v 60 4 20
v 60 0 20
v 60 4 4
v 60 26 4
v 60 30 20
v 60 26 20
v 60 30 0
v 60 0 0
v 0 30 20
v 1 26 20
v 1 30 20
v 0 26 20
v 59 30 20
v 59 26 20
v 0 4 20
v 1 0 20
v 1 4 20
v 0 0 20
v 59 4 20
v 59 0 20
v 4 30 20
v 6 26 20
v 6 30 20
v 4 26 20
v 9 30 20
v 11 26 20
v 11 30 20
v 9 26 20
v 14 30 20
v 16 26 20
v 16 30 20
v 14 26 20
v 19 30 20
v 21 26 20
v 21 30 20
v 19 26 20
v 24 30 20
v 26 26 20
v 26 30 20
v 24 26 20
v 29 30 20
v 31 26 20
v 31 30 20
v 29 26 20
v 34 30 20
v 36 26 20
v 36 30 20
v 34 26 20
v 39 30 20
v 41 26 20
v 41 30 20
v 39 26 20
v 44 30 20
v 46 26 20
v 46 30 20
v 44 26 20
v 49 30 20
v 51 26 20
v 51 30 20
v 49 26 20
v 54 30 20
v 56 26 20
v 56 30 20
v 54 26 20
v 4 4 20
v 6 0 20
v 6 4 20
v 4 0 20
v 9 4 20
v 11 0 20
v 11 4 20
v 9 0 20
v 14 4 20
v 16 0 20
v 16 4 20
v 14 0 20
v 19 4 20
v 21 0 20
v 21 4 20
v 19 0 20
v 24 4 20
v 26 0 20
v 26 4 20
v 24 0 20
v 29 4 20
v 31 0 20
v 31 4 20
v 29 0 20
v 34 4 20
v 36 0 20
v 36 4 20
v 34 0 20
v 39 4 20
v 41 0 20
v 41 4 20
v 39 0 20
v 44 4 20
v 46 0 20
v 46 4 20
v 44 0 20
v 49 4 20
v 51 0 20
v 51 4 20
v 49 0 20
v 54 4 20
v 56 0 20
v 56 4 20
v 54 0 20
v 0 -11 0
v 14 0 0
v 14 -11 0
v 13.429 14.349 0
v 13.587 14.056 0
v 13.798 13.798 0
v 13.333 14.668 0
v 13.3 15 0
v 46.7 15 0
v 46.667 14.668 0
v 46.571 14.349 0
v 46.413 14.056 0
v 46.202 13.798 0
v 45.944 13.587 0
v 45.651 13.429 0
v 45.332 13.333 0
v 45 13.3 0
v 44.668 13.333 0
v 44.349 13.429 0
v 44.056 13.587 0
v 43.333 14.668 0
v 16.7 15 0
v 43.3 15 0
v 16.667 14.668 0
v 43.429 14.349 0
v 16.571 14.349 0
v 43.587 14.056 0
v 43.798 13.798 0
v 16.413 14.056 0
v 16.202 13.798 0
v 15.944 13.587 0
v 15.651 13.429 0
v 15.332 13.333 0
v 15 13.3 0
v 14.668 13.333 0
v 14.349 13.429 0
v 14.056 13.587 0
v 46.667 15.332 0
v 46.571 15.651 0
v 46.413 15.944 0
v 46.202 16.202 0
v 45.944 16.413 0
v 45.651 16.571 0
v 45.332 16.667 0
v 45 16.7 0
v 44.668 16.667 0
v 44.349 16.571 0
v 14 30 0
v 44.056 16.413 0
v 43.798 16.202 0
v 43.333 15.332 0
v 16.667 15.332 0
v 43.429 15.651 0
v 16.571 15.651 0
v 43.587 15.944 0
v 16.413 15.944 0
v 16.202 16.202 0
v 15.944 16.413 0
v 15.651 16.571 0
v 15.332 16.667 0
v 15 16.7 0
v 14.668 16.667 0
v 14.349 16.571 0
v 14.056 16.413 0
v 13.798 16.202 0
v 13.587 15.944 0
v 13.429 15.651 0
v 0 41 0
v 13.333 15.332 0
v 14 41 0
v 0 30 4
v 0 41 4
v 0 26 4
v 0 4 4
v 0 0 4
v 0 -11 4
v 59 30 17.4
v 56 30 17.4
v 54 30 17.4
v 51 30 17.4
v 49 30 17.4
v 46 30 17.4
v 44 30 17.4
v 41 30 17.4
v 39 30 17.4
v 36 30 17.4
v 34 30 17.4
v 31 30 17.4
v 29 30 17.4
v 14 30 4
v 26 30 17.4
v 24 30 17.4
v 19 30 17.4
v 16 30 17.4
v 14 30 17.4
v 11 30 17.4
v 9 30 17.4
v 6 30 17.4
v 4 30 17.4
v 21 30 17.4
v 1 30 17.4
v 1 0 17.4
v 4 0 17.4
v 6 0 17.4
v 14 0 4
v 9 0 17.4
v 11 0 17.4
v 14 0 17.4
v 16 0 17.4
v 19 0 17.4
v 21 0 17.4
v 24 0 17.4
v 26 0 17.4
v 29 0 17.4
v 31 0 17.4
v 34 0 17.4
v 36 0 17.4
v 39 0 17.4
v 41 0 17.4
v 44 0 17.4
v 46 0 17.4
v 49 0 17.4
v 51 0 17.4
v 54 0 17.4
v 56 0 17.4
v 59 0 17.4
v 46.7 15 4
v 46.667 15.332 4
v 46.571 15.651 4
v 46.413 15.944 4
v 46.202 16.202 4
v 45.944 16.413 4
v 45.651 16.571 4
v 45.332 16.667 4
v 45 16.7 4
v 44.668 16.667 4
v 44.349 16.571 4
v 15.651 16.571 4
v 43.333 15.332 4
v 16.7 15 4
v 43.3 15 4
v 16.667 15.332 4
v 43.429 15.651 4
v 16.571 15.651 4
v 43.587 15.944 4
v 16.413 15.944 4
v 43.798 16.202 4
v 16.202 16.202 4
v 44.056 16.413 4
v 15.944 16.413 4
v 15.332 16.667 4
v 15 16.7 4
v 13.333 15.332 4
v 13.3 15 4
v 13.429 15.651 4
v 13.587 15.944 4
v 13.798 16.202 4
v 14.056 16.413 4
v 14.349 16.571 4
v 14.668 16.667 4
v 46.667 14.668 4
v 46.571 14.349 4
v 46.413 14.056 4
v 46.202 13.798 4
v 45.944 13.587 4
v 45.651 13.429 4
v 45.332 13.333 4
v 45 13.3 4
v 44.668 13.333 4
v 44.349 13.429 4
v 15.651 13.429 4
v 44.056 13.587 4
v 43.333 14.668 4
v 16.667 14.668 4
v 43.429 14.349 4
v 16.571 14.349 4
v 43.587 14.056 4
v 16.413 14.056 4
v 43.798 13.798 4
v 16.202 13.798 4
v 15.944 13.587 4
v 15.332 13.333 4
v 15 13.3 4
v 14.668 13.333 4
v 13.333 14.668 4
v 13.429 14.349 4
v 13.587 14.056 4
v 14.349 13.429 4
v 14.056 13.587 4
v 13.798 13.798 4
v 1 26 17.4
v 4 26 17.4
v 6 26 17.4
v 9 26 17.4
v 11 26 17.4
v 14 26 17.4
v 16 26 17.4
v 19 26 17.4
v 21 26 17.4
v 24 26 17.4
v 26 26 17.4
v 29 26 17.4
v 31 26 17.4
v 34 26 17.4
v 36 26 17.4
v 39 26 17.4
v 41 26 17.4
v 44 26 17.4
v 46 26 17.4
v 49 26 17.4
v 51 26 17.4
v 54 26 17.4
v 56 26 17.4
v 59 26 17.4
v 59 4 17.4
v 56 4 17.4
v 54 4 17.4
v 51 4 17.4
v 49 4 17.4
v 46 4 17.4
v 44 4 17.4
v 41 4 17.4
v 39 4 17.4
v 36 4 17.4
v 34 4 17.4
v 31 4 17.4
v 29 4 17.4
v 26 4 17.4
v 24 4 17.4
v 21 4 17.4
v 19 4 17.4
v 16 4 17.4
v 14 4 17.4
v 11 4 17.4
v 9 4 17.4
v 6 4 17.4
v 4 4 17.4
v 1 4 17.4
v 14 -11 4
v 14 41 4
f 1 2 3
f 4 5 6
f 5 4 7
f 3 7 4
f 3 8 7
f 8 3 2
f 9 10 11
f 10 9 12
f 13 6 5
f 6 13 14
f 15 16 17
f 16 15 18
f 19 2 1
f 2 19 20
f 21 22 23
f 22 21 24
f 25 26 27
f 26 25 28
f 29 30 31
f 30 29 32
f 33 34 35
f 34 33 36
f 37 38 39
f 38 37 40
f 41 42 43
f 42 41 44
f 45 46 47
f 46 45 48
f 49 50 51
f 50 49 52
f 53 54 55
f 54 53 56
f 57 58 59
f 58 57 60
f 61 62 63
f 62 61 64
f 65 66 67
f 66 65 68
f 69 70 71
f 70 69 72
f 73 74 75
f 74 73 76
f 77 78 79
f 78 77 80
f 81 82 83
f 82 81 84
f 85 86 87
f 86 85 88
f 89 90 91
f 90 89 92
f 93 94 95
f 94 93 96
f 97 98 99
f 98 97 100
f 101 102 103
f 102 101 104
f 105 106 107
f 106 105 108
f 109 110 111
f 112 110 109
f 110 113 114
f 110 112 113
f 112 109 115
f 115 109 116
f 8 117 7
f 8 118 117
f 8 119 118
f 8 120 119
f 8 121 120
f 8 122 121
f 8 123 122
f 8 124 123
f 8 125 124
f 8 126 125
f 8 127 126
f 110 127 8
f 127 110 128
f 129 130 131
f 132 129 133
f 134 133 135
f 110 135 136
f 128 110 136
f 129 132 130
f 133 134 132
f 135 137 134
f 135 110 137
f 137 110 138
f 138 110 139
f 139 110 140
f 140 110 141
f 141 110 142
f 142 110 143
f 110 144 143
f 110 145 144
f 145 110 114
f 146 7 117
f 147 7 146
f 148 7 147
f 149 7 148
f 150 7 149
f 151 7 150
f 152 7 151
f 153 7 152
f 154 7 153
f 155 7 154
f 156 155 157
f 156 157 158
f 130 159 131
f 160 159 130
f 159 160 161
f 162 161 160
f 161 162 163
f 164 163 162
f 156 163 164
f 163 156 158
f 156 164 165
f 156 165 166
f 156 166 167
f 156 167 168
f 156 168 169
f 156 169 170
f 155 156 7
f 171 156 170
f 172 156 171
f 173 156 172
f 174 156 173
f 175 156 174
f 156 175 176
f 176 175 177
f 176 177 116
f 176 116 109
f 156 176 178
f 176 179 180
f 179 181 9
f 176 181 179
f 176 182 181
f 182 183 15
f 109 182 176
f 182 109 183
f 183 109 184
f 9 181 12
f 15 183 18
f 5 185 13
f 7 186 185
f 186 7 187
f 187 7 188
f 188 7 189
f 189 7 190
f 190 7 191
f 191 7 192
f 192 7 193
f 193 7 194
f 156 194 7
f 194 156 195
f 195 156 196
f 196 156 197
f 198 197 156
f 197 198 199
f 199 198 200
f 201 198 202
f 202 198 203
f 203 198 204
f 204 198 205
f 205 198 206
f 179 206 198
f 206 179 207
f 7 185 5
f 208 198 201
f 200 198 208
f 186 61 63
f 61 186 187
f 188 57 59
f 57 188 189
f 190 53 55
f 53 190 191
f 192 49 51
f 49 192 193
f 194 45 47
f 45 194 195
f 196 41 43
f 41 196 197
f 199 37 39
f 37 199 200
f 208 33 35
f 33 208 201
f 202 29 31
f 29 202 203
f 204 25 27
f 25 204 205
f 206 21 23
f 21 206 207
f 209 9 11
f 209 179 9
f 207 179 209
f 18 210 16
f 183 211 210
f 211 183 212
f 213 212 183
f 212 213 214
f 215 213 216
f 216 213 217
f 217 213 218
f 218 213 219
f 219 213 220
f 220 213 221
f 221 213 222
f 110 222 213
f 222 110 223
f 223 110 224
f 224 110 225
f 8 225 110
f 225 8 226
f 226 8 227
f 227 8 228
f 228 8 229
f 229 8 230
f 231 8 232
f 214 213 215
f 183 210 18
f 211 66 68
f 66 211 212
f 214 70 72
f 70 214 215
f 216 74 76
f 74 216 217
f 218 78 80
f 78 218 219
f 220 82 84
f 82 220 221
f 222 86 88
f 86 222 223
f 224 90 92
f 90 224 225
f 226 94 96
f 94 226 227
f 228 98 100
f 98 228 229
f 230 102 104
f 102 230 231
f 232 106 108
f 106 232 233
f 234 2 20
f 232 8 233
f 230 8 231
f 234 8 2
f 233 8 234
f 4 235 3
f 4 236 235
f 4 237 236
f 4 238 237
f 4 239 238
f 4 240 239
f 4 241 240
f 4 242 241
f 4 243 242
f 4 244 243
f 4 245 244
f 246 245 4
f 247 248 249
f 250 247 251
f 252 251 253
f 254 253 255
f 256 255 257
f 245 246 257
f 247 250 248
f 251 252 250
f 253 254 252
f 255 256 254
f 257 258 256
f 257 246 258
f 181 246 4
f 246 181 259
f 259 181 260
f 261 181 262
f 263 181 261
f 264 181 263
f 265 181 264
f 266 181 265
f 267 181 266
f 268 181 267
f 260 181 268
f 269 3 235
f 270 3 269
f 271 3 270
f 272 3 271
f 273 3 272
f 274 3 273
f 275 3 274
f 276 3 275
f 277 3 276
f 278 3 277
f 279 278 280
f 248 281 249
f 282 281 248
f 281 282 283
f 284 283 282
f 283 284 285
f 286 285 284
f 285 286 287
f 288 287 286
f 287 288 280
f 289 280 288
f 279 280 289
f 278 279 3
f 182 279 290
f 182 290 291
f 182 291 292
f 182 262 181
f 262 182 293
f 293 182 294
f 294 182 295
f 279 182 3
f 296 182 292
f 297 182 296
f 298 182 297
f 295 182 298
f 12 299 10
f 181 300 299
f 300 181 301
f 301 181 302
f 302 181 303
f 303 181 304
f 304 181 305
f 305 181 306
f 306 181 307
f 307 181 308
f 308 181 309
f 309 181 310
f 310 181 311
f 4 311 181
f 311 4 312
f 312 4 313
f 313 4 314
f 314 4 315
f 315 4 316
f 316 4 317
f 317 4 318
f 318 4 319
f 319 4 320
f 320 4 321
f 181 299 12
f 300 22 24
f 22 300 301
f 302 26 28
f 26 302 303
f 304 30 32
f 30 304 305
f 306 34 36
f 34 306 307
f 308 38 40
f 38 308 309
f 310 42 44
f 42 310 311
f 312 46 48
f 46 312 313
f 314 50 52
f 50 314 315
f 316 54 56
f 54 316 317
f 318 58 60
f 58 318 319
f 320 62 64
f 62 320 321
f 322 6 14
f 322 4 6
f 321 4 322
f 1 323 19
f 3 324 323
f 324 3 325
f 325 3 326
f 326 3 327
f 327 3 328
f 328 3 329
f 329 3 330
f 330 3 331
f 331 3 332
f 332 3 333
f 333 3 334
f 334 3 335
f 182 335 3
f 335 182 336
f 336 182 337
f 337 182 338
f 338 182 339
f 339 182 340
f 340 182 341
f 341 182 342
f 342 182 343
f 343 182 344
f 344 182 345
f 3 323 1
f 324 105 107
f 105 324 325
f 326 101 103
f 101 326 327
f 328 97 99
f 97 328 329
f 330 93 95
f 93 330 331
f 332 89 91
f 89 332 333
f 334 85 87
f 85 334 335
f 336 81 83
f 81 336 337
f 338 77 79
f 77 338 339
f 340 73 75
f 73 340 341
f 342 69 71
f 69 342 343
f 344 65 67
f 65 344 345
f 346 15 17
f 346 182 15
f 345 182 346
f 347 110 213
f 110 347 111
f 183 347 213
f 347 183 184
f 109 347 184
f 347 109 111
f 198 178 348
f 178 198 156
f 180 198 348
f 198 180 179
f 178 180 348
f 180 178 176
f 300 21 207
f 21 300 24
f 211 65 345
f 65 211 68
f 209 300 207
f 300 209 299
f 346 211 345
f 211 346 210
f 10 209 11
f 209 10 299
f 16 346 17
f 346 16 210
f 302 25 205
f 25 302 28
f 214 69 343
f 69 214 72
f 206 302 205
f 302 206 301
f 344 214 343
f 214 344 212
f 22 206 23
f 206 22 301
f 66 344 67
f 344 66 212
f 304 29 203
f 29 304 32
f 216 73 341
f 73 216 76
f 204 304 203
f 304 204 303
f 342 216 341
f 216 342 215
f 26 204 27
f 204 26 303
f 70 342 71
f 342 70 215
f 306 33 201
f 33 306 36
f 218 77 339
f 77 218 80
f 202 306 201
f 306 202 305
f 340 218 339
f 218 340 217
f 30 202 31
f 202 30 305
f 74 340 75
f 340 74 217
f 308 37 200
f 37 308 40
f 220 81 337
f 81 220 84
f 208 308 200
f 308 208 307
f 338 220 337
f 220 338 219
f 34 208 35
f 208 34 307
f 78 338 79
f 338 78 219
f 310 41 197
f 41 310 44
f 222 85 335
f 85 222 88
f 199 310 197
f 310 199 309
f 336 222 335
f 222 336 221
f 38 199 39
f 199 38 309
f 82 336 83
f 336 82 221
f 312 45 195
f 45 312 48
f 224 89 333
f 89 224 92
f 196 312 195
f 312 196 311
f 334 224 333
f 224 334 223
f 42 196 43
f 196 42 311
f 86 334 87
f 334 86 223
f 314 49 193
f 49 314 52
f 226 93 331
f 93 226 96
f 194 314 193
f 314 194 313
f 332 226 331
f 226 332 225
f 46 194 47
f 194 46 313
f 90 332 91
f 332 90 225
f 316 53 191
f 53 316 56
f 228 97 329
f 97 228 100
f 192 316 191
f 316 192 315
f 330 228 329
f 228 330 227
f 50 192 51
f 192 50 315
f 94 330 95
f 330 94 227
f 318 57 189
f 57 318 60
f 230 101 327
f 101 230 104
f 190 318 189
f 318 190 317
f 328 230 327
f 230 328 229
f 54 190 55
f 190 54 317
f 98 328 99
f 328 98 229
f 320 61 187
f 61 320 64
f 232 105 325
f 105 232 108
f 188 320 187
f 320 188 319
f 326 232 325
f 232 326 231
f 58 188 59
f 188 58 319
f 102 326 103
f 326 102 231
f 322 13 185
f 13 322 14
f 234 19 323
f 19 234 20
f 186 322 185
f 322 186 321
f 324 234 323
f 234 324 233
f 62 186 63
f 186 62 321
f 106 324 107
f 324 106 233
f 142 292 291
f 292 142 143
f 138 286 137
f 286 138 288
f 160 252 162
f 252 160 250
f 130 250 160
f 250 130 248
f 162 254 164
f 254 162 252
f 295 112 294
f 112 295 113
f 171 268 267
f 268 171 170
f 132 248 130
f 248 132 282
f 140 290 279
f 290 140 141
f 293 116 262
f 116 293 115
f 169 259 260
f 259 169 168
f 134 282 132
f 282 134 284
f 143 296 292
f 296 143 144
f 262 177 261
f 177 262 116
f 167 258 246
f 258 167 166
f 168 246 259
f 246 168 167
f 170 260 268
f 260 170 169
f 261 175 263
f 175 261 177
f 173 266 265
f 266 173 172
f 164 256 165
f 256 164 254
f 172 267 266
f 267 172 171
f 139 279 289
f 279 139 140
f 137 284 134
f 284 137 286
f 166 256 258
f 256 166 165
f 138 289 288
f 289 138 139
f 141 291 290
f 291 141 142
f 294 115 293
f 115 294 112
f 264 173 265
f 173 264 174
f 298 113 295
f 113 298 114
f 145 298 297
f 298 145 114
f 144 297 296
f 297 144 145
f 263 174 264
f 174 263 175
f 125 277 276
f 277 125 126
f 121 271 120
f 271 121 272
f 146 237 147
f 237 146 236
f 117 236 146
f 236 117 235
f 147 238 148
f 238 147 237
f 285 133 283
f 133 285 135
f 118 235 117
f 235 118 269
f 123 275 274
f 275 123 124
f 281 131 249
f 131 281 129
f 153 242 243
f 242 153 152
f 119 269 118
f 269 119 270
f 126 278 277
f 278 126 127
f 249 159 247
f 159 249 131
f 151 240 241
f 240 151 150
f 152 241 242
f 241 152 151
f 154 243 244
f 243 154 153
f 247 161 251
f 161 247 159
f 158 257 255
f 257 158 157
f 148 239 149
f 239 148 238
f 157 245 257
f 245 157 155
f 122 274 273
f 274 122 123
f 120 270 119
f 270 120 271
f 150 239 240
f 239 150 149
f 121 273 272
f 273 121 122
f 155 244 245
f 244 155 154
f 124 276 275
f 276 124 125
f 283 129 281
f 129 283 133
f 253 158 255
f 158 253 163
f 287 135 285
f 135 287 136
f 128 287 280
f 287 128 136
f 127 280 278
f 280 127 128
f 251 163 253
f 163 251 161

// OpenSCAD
$fn = 32;

// ----------------------------------------------------------------------
// Cable duct: 60 x 30 x 20 mm, 12 fingers
// ----------------------------------------------------------------------

// --- parameters (mm) ---
duct_len = 60;            // duct length, X
duct_w = 30;              // duct width, Y
duct_h = 20;              // duct height, Z
wall_t = 4;               // side wall thickness
floor_t = 4;              // floor thickness
slot_w = 3;               // finger slot width
slot_h = 13.4;            // finger slot height
fingers = 12;             // number of finger slots per side
pitch = 5;                // finger pitch
hole_d = 3.4;             // floor mounting hole
hole_n = 2;               // mounting holes in the floor
ear_w = 12;               // mounting ear width
ear_l = 14;               // mounting ear length

module shell() {
  difference() {
    cube([duct_len, duct_w, duct_h]);
    /* open top channel */
    translate([-wall_t - 1, wall_t, floor_t])
      cube([duct_len + 2 * wall_t + 2, duct_w - 2 * wall_t, duct_h + 1]);
  }
}

module ears() {
  translate([0, -ear_w + 1, 0]) cube([ear_l, ear_w, floor_t]);
  translate([0, duct_w - 1, 0]) cube([ear_l, ear_w, floor_t]);
}

difference() {
  union() {
    shell();
    ears();
  }
  /* finger slots cut through both side walls */
  for (i = [0 : fingers - 1]) translate([pitch / 2 + i * pitch - slot_w / 2, -1, floor_t + slot_h]) cube([slot_w, duct_w + 2, duct_h]);
  for (i = [0 : hole_n - 1]) translate([(duct_len / hole_n) * (i + 0.5), duct_w / 2, -1]) cylinder(h = floor_t + 2, d = hole_d);
}
